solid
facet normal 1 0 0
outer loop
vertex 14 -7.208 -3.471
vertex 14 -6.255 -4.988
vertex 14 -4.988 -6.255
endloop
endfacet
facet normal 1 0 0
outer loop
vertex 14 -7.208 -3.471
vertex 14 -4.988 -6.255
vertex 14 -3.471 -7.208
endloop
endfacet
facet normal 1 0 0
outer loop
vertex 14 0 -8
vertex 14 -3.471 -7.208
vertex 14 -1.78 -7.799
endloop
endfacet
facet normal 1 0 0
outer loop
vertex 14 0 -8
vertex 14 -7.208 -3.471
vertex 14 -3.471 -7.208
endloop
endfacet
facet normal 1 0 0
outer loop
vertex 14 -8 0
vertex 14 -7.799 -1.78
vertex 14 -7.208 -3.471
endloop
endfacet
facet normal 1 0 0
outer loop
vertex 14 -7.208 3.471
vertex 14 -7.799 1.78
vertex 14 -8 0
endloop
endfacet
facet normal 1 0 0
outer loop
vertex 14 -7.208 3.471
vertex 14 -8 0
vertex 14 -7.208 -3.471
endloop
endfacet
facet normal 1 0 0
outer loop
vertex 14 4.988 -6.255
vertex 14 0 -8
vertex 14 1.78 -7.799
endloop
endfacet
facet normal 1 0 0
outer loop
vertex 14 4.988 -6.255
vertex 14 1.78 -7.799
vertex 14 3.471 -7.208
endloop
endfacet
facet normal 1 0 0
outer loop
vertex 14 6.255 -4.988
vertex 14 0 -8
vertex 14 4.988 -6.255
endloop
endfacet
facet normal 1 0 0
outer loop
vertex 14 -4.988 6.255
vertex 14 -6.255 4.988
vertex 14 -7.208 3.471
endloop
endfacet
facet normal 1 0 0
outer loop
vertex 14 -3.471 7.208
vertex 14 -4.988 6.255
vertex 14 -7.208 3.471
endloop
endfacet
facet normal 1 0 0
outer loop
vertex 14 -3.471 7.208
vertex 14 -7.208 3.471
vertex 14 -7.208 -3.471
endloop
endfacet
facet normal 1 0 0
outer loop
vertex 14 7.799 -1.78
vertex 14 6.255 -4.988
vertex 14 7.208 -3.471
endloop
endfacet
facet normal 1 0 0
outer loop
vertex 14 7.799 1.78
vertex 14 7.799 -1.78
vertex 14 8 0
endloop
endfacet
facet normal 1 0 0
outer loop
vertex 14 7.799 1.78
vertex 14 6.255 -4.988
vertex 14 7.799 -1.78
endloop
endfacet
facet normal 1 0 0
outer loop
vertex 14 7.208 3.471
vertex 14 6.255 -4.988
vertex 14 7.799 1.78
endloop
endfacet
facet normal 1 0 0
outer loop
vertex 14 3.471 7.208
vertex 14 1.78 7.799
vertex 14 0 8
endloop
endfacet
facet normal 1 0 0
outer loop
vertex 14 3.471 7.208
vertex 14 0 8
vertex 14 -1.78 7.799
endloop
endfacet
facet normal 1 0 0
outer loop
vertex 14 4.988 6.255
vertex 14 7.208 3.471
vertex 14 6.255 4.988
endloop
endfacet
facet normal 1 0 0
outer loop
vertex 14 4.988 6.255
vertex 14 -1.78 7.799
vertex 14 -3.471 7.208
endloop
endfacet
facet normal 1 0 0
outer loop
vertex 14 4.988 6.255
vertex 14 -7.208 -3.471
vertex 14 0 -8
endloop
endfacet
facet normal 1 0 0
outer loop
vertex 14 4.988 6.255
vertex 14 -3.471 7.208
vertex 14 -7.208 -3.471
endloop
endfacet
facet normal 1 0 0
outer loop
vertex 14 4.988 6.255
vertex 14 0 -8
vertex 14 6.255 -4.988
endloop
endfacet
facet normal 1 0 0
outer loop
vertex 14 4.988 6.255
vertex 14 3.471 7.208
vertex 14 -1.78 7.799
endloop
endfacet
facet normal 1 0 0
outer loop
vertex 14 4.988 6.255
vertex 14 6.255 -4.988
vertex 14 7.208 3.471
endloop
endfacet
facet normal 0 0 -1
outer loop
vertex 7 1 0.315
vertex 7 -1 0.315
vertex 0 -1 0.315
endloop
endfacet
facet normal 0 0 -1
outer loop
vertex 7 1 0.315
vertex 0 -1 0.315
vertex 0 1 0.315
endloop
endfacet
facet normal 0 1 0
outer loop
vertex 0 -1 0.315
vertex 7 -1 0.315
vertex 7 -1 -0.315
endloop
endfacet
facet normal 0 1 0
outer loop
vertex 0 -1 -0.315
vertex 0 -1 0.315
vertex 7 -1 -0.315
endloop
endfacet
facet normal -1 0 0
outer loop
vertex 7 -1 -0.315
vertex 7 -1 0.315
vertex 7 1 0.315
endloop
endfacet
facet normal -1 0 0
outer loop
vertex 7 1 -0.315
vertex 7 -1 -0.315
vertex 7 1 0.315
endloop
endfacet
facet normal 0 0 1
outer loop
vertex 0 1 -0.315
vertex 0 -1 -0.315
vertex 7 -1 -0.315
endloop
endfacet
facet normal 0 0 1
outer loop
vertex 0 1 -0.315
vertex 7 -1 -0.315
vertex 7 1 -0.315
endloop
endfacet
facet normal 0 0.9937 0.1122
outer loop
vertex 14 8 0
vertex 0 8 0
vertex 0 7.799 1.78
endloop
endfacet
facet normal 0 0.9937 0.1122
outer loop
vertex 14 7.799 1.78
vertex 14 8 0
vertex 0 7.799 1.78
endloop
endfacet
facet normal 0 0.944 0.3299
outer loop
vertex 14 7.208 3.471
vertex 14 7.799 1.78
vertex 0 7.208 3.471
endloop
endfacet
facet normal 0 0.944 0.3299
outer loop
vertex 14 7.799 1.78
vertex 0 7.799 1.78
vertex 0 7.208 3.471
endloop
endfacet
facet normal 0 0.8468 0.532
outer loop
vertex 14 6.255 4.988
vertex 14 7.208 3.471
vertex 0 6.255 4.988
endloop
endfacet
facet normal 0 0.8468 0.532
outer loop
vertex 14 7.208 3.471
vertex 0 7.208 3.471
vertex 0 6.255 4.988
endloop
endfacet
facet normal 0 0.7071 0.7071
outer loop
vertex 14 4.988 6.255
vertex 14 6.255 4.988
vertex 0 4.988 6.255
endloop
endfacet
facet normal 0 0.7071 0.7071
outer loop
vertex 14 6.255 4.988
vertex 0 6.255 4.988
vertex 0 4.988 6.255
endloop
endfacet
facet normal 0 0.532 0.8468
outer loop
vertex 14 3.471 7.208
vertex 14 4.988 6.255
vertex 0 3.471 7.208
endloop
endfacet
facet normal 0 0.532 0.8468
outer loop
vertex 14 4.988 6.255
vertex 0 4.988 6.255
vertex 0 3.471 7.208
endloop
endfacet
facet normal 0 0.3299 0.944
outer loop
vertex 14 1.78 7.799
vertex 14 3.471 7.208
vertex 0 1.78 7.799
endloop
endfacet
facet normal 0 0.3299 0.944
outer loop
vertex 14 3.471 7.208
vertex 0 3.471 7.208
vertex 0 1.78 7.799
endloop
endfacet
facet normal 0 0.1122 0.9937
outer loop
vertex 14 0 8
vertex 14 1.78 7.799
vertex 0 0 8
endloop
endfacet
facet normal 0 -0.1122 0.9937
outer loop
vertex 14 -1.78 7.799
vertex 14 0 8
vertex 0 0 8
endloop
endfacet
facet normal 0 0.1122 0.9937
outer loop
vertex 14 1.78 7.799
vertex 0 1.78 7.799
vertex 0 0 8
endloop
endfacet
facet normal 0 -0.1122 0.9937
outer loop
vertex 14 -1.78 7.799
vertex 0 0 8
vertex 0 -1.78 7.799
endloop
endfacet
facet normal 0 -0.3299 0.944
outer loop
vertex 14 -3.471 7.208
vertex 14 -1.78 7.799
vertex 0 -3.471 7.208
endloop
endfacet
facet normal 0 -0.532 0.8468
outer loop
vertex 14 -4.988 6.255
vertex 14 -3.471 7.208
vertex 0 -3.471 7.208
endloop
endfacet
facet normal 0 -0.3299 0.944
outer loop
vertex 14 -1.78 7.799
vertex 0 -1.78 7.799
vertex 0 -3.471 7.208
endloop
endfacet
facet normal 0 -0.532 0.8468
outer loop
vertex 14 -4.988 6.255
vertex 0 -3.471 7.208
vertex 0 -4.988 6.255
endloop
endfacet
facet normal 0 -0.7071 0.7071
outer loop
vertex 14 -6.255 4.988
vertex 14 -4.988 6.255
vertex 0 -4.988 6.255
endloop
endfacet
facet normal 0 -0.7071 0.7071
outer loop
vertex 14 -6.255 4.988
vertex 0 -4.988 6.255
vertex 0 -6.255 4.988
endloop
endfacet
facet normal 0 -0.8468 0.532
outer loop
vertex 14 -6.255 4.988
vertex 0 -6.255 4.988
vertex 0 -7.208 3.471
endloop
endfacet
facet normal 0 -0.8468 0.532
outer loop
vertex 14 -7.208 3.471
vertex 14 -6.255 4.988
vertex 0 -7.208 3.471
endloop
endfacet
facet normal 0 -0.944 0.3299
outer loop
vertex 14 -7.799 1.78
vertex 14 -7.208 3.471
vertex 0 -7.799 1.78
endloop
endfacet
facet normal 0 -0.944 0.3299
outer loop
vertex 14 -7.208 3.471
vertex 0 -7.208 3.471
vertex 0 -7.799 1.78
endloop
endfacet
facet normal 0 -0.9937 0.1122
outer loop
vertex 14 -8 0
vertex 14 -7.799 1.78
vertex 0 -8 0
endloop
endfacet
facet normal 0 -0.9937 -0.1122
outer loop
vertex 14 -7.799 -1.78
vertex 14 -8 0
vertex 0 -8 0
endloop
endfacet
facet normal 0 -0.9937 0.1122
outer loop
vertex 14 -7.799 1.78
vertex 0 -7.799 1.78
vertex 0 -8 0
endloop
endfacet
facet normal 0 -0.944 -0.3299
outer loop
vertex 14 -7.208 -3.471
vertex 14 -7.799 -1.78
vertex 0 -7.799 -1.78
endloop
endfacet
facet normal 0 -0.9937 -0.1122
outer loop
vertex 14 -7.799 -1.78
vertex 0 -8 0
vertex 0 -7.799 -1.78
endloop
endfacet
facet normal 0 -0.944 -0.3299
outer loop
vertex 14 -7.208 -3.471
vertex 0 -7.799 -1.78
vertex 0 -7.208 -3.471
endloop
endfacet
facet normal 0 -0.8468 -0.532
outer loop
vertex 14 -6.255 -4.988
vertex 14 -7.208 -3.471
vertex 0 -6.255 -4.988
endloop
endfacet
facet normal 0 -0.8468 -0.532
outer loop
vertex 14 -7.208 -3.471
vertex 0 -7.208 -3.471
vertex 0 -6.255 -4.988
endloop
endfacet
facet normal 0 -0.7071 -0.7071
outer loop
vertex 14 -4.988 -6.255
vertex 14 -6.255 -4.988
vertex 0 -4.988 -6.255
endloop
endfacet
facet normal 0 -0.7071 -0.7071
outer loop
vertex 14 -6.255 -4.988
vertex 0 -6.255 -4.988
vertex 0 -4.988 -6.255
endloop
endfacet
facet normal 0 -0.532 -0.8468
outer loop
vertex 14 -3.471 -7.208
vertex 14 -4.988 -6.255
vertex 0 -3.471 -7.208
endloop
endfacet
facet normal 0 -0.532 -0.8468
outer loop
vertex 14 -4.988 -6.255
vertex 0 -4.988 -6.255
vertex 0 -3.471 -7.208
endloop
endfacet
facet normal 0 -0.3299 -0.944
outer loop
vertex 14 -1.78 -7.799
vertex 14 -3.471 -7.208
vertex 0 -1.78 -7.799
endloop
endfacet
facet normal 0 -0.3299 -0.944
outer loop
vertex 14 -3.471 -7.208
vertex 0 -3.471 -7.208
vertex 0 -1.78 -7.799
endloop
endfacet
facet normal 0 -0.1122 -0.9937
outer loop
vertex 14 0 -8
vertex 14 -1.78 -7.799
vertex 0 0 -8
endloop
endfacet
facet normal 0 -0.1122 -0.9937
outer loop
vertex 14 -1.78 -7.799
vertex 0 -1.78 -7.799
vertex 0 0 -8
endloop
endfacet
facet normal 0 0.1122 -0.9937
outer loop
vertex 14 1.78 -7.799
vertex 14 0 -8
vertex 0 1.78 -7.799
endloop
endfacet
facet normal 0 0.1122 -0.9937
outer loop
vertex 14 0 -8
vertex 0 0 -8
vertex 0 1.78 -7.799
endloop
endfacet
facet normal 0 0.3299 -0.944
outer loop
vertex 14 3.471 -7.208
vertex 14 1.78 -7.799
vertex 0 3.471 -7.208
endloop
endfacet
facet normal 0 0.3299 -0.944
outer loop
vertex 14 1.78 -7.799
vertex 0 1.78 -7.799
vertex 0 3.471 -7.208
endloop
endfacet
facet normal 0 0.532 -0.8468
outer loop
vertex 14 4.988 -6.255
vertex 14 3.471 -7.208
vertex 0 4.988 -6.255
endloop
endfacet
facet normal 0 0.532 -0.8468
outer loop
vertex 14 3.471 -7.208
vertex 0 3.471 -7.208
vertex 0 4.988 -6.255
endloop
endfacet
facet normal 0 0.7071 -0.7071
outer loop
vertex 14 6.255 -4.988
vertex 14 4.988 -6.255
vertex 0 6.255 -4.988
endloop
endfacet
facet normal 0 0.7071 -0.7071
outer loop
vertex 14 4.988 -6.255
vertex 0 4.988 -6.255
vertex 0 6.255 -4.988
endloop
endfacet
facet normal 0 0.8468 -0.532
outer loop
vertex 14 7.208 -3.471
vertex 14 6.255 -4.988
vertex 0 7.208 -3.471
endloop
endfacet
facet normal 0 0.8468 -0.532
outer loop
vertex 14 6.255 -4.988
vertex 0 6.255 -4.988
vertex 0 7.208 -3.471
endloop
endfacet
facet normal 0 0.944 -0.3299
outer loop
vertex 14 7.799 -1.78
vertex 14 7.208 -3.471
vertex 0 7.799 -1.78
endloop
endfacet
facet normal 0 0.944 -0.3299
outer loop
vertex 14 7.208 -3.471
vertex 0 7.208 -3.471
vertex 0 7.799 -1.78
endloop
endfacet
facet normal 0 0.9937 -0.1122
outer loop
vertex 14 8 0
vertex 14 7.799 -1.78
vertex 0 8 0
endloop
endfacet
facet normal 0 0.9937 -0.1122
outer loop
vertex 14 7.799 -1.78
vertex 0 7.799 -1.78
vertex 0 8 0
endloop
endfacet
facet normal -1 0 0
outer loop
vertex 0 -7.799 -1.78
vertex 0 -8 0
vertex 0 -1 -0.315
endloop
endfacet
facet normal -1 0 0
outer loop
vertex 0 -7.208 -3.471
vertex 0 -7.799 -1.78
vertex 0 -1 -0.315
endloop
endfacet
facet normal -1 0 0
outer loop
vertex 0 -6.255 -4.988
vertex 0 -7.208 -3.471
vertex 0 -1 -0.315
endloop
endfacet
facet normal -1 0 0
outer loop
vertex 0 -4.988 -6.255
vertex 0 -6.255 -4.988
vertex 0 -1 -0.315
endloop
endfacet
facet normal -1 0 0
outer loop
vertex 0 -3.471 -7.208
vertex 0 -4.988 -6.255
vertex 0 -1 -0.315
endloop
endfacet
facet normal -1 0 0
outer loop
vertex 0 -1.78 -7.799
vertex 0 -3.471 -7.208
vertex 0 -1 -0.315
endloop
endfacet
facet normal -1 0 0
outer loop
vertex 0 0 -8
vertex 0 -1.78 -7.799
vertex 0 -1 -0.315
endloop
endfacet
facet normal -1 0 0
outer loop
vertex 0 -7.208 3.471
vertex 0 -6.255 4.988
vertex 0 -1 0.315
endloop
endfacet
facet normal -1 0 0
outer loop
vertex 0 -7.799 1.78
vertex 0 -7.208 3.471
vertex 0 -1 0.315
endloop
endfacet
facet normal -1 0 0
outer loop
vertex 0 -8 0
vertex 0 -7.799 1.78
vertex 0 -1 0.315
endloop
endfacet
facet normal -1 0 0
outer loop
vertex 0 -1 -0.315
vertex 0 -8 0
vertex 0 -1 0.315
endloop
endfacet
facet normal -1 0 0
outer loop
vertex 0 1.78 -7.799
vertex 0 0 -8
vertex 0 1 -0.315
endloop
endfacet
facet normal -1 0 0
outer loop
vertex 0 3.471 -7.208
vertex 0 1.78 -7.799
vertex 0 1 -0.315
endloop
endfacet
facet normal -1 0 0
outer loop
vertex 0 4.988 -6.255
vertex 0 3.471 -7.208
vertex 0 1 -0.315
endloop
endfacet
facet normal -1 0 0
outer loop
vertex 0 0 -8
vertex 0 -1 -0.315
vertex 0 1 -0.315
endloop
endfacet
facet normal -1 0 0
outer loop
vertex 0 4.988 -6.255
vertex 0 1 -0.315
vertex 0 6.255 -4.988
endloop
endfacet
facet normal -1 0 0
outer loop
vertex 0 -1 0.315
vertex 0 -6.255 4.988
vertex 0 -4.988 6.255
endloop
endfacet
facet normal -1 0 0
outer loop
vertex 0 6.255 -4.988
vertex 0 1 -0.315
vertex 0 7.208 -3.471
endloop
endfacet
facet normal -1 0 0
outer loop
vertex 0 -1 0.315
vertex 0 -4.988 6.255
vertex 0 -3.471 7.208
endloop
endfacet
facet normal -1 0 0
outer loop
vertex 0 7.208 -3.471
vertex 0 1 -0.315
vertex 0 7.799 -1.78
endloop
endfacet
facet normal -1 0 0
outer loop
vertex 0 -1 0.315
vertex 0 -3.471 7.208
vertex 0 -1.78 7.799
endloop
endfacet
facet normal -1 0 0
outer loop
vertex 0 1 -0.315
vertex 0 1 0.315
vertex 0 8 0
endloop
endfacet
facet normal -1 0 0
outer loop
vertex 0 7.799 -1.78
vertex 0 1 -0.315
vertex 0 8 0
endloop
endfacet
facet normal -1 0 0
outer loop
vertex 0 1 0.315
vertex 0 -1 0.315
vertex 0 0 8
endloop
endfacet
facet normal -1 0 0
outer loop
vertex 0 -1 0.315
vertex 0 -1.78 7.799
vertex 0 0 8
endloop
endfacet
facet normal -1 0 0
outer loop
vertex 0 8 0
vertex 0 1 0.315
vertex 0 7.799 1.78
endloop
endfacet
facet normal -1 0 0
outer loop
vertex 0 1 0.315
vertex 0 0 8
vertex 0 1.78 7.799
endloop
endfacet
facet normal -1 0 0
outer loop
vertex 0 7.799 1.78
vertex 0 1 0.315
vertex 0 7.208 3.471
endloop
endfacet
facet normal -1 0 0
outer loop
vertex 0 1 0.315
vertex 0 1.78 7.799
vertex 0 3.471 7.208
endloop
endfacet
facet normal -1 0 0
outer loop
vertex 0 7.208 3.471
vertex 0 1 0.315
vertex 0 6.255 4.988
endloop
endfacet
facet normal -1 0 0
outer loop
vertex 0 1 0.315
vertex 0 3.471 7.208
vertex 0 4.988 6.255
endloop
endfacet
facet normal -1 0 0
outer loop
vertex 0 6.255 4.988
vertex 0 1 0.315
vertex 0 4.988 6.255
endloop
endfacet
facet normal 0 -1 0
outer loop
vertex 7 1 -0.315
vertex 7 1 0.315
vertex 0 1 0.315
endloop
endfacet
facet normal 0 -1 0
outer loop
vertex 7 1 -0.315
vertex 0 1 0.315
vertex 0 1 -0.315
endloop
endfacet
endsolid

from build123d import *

# Parameters (mm, degrees)
F0_R     = 8
F1_DEPTH = 14
F2_W     = 0.63
F2_H     = 0.63
F3_DEPTH = 7
F6_W     = 0.685
F6_H     = 0.63
F6_W_2   = 0.63
F7_DEPTH = 7


with BuildPart() as f1:
    # F0 (on Right) → F1 (new body)
    with BuildSketch(Plane.YZ):
        Circle(F0_R)
    extrude(amount=F1_DEPTH)

    # F2 (on Right) → F3 (cut)
    with BuildSketch(Plane.YZ):
        Rectangle(F2_W, F2_H)
    extrude(amount=F3_DEPTH, mode=Mode.SUBTRACT)

    # F6 (on offset) → F7 (cut)
    with BuildSketch(Plane(origin=(7, 0, 0), x_dir=(0, 1, 0), z_dir=(-1, 0, 0))):
        with Locations((-0.6575, 0)):
            Rectangle(F6_W, F6_H)
        Rectangle(F6_W_2, F6_H)
        with Locations((0.6575, 0)):
            Rectangle(F6_W, F6_H)
    extrude(amount=F7_DEPTH, mode=Mode.SUBTRACT)


solid = f1.part
